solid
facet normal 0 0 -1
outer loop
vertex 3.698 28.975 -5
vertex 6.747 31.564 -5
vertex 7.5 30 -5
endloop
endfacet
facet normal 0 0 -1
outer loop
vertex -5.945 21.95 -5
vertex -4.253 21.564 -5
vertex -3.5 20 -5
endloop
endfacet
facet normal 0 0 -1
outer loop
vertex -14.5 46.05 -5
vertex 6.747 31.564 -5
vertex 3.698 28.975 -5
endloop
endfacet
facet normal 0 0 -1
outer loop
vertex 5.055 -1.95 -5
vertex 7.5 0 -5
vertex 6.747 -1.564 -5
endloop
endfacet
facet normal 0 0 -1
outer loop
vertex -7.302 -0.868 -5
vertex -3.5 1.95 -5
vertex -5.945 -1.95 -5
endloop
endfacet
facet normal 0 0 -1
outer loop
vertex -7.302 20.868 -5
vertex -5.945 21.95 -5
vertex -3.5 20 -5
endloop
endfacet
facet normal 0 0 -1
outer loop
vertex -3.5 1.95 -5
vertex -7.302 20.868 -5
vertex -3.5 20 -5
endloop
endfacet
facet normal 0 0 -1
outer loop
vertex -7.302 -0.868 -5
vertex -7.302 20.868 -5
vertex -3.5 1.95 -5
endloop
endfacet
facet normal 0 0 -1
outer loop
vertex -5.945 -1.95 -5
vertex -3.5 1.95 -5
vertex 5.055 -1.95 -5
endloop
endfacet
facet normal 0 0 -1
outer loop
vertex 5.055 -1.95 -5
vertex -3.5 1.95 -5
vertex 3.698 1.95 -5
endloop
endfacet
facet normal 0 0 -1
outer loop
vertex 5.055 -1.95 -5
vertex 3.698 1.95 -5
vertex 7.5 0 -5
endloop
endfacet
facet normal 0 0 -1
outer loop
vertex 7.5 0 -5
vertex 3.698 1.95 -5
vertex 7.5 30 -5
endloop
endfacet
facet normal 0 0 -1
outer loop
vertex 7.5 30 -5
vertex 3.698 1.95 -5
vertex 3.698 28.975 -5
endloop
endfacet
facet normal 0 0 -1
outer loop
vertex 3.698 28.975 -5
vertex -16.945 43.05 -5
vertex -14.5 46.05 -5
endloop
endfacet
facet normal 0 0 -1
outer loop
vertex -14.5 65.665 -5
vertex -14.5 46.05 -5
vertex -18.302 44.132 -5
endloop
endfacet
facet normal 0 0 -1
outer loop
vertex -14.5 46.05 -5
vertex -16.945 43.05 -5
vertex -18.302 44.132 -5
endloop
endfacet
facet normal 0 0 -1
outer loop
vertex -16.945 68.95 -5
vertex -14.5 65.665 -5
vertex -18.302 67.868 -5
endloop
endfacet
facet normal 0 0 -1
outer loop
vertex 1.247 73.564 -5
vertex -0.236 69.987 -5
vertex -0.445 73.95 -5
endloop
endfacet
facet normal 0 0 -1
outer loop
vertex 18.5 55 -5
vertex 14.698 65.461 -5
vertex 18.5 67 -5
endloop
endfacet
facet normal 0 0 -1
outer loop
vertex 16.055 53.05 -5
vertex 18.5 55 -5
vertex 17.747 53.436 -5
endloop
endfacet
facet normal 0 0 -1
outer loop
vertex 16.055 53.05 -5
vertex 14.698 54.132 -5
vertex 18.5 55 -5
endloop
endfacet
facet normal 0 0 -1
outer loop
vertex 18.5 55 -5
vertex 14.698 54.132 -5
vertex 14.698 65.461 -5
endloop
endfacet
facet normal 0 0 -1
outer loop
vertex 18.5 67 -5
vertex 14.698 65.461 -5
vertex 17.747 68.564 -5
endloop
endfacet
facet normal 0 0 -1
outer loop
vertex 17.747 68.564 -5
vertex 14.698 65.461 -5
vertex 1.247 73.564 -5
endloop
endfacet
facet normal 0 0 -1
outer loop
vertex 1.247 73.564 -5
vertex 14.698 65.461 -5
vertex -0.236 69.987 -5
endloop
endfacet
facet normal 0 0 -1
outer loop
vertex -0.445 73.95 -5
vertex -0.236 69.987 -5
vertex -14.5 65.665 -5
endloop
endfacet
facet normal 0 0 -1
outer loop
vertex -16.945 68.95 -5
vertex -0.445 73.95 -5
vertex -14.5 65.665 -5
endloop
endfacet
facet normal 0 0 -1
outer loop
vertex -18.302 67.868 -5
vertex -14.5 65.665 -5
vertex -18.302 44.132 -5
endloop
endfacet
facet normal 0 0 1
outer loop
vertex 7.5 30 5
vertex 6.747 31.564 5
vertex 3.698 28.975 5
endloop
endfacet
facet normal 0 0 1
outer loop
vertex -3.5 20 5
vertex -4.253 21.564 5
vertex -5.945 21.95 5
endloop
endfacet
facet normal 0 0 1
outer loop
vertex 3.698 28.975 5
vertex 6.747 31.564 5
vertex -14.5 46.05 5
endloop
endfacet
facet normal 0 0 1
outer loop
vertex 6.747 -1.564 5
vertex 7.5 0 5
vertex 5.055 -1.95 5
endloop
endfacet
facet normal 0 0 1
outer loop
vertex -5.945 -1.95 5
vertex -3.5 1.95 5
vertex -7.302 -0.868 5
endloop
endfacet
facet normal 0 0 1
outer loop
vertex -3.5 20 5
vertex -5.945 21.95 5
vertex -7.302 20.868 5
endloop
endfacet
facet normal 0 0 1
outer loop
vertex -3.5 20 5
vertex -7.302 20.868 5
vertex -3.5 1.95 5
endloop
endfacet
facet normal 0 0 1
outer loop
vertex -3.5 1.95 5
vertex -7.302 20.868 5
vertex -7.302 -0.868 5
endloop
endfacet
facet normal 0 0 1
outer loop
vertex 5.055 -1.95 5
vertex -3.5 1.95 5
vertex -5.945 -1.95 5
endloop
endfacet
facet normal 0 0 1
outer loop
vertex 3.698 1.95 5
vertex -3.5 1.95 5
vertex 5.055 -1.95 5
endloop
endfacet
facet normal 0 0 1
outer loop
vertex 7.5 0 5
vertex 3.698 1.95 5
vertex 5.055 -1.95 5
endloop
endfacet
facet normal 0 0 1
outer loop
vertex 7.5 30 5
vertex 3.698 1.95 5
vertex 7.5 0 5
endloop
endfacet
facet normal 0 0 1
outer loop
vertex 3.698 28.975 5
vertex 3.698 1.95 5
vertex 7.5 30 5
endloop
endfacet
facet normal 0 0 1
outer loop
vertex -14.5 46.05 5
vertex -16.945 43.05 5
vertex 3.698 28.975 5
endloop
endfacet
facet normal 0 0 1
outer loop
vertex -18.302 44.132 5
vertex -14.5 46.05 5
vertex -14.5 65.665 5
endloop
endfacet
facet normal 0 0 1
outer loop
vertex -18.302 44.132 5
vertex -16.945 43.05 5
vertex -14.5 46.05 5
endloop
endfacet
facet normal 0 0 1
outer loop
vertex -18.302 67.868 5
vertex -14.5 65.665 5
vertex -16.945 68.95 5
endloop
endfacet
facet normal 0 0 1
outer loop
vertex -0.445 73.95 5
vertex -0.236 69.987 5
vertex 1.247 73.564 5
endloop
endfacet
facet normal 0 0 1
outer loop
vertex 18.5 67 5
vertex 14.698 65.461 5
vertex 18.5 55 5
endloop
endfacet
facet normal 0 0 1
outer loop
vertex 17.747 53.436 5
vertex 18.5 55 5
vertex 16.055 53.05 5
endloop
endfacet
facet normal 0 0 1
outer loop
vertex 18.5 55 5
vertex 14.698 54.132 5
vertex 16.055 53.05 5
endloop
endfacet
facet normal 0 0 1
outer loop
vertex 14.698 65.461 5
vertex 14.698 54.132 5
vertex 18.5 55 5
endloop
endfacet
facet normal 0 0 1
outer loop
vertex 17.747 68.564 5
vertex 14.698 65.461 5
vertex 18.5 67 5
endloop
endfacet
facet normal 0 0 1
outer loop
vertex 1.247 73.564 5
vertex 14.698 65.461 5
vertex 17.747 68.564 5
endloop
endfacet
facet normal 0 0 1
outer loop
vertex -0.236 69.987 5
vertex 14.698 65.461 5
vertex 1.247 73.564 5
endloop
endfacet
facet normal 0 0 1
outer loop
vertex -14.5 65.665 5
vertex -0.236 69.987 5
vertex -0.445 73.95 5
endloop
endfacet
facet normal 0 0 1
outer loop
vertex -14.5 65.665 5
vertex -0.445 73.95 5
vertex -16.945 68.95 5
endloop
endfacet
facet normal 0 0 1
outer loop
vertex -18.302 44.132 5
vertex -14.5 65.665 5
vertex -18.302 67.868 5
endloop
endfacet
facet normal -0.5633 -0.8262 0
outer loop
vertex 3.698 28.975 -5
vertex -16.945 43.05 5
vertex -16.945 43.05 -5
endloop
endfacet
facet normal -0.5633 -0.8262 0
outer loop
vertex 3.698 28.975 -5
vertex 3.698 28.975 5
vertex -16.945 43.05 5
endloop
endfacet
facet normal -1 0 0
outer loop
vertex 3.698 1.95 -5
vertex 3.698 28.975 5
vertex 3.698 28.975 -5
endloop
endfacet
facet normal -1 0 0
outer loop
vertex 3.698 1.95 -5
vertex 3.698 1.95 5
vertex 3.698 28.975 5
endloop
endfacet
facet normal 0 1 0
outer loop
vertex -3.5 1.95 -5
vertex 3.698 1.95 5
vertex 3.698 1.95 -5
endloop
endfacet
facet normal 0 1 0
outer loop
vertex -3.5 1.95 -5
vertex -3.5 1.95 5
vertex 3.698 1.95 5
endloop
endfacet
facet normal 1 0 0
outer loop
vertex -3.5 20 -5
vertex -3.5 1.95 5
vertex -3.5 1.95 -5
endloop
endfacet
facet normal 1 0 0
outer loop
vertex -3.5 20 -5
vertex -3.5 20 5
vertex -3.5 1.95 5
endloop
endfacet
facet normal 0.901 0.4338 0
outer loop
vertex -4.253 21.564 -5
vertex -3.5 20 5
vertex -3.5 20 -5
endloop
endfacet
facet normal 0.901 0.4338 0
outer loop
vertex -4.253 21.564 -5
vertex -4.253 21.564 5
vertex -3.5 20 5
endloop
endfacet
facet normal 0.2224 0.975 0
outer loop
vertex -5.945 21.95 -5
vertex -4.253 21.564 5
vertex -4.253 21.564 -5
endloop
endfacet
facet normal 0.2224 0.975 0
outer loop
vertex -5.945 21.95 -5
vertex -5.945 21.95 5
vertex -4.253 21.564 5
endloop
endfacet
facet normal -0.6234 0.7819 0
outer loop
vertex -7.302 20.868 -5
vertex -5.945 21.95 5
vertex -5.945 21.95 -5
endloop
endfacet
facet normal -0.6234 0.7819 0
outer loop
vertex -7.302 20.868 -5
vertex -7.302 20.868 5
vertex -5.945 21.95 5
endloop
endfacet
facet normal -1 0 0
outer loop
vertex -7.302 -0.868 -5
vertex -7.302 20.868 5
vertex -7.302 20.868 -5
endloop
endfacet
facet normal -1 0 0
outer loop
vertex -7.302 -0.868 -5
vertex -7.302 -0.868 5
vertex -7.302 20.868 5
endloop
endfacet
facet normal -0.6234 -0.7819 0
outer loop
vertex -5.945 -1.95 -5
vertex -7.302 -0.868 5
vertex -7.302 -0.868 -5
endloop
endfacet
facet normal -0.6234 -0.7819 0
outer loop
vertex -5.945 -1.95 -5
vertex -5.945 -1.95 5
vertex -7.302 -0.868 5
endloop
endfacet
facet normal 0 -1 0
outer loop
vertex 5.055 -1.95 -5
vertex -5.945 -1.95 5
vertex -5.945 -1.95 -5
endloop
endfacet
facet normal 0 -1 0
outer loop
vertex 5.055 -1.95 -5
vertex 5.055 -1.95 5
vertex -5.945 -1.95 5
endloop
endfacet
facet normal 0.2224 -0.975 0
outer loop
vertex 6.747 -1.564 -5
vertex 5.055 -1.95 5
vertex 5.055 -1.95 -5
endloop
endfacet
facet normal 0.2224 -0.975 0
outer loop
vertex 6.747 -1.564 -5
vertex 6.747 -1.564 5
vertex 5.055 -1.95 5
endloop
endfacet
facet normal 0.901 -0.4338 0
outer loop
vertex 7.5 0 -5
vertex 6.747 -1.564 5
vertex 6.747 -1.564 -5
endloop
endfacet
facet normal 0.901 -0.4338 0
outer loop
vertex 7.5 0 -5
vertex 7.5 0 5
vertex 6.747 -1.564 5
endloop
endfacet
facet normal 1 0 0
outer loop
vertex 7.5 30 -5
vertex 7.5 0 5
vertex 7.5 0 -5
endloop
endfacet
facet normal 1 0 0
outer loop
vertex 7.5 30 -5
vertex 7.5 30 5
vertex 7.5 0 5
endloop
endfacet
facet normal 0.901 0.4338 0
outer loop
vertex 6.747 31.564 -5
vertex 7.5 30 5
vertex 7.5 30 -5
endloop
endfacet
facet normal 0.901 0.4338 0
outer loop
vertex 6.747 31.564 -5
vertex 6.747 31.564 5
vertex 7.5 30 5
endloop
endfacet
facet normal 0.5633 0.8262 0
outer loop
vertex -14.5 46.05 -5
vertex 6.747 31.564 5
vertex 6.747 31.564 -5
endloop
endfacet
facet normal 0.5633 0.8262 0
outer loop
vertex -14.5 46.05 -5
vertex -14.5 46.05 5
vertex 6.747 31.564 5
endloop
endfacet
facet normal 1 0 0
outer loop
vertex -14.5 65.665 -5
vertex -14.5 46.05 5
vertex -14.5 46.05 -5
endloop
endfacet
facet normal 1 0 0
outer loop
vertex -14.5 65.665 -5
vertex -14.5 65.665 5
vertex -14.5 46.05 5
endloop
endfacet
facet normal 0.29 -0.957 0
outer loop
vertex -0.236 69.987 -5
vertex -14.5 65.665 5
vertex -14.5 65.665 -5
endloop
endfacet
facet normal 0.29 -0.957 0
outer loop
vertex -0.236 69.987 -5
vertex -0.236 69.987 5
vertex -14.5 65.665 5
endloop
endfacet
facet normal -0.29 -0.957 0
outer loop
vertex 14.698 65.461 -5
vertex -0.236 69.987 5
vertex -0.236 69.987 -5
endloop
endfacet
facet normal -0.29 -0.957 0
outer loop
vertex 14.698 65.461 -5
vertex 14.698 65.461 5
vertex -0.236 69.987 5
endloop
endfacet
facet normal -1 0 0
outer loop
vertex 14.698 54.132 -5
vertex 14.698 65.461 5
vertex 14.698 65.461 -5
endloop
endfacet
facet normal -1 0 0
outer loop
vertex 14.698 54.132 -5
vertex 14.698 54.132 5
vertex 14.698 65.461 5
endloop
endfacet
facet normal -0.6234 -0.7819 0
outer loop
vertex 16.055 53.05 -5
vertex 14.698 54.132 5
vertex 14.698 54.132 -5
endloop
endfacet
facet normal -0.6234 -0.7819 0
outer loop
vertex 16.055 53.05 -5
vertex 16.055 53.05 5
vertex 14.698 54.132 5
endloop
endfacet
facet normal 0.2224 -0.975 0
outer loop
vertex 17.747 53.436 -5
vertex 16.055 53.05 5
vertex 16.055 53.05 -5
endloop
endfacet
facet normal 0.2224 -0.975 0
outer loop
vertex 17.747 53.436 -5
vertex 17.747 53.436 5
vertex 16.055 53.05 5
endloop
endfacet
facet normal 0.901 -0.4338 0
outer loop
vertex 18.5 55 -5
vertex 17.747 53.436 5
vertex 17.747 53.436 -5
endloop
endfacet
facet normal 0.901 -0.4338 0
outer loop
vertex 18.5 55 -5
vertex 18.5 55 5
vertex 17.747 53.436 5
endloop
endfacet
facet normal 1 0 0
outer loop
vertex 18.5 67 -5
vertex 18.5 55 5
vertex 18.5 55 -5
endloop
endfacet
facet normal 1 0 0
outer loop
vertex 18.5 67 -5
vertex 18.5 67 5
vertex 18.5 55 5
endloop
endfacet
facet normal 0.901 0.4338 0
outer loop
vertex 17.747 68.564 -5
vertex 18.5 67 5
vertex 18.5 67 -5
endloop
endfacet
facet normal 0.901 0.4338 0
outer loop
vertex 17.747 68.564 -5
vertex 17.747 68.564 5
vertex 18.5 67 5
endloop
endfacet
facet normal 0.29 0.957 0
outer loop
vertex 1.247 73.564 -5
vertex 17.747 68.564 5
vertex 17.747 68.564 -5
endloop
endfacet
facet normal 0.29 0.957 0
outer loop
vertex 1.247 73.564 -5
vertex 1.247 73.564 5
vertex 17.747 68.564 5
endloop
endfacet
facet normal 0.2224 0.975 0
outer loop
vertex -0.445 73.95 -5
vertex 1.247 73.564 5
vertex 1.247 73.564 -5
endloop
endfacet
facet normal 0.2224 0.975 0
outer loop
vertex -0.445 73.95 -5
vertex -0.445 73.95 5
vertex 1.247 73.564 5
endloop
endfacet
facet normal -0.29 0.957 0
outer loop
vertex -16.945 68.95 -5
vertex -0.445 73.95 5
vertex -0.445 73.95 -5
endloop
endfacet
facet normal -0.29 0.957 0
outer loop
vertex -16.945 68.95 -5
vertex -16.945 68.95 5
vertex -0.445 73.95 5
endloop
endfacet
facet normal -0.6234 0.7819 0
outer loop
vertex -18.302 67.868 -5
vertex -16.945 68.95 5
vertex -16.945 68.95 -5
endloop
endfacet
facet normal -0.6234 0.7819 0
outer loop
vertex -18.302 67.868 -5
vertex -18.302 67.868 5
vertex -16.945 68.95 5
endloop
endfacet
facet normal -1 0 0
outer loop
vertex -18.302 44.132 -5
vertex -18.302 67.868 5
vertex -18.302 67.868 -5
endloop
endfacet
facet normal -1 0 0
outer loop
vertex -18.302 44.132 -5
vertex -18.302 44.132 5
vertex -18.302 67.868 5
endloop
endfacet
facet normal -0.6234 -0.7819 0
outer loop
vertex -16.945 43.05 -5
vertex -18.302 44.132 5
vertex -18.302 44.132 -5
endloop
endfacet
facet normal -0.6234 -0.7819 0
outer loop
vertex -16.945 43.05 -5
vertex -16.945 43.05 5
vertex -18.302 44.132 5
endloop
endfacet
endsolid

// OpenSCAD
$fa = 1;

thick = 4;
x_top = 11/2;
x_bottom = 33/2;
y_bottom = 67;

module hanger() {
    pts = [
        [-x_top,20],
        [-x_top,0],
        [x_top,0],
        [x_top,30],
        [-x_bottom,45],
        [-x_bottom,y_bottom],
        [0,y_bottom+5],
        [x_bottom,y_bottom],
        [x_bottom,y_bottom-12],
    ];

    linear_extrude(10, center = true)
    for (p = [0:7]) {
        hull() {
            translate(pts[p]) circle(d = thick, center = true);
            translate(pts[p+1]) circle(d = thick, center = true);
        }
    }
}

hanger();
